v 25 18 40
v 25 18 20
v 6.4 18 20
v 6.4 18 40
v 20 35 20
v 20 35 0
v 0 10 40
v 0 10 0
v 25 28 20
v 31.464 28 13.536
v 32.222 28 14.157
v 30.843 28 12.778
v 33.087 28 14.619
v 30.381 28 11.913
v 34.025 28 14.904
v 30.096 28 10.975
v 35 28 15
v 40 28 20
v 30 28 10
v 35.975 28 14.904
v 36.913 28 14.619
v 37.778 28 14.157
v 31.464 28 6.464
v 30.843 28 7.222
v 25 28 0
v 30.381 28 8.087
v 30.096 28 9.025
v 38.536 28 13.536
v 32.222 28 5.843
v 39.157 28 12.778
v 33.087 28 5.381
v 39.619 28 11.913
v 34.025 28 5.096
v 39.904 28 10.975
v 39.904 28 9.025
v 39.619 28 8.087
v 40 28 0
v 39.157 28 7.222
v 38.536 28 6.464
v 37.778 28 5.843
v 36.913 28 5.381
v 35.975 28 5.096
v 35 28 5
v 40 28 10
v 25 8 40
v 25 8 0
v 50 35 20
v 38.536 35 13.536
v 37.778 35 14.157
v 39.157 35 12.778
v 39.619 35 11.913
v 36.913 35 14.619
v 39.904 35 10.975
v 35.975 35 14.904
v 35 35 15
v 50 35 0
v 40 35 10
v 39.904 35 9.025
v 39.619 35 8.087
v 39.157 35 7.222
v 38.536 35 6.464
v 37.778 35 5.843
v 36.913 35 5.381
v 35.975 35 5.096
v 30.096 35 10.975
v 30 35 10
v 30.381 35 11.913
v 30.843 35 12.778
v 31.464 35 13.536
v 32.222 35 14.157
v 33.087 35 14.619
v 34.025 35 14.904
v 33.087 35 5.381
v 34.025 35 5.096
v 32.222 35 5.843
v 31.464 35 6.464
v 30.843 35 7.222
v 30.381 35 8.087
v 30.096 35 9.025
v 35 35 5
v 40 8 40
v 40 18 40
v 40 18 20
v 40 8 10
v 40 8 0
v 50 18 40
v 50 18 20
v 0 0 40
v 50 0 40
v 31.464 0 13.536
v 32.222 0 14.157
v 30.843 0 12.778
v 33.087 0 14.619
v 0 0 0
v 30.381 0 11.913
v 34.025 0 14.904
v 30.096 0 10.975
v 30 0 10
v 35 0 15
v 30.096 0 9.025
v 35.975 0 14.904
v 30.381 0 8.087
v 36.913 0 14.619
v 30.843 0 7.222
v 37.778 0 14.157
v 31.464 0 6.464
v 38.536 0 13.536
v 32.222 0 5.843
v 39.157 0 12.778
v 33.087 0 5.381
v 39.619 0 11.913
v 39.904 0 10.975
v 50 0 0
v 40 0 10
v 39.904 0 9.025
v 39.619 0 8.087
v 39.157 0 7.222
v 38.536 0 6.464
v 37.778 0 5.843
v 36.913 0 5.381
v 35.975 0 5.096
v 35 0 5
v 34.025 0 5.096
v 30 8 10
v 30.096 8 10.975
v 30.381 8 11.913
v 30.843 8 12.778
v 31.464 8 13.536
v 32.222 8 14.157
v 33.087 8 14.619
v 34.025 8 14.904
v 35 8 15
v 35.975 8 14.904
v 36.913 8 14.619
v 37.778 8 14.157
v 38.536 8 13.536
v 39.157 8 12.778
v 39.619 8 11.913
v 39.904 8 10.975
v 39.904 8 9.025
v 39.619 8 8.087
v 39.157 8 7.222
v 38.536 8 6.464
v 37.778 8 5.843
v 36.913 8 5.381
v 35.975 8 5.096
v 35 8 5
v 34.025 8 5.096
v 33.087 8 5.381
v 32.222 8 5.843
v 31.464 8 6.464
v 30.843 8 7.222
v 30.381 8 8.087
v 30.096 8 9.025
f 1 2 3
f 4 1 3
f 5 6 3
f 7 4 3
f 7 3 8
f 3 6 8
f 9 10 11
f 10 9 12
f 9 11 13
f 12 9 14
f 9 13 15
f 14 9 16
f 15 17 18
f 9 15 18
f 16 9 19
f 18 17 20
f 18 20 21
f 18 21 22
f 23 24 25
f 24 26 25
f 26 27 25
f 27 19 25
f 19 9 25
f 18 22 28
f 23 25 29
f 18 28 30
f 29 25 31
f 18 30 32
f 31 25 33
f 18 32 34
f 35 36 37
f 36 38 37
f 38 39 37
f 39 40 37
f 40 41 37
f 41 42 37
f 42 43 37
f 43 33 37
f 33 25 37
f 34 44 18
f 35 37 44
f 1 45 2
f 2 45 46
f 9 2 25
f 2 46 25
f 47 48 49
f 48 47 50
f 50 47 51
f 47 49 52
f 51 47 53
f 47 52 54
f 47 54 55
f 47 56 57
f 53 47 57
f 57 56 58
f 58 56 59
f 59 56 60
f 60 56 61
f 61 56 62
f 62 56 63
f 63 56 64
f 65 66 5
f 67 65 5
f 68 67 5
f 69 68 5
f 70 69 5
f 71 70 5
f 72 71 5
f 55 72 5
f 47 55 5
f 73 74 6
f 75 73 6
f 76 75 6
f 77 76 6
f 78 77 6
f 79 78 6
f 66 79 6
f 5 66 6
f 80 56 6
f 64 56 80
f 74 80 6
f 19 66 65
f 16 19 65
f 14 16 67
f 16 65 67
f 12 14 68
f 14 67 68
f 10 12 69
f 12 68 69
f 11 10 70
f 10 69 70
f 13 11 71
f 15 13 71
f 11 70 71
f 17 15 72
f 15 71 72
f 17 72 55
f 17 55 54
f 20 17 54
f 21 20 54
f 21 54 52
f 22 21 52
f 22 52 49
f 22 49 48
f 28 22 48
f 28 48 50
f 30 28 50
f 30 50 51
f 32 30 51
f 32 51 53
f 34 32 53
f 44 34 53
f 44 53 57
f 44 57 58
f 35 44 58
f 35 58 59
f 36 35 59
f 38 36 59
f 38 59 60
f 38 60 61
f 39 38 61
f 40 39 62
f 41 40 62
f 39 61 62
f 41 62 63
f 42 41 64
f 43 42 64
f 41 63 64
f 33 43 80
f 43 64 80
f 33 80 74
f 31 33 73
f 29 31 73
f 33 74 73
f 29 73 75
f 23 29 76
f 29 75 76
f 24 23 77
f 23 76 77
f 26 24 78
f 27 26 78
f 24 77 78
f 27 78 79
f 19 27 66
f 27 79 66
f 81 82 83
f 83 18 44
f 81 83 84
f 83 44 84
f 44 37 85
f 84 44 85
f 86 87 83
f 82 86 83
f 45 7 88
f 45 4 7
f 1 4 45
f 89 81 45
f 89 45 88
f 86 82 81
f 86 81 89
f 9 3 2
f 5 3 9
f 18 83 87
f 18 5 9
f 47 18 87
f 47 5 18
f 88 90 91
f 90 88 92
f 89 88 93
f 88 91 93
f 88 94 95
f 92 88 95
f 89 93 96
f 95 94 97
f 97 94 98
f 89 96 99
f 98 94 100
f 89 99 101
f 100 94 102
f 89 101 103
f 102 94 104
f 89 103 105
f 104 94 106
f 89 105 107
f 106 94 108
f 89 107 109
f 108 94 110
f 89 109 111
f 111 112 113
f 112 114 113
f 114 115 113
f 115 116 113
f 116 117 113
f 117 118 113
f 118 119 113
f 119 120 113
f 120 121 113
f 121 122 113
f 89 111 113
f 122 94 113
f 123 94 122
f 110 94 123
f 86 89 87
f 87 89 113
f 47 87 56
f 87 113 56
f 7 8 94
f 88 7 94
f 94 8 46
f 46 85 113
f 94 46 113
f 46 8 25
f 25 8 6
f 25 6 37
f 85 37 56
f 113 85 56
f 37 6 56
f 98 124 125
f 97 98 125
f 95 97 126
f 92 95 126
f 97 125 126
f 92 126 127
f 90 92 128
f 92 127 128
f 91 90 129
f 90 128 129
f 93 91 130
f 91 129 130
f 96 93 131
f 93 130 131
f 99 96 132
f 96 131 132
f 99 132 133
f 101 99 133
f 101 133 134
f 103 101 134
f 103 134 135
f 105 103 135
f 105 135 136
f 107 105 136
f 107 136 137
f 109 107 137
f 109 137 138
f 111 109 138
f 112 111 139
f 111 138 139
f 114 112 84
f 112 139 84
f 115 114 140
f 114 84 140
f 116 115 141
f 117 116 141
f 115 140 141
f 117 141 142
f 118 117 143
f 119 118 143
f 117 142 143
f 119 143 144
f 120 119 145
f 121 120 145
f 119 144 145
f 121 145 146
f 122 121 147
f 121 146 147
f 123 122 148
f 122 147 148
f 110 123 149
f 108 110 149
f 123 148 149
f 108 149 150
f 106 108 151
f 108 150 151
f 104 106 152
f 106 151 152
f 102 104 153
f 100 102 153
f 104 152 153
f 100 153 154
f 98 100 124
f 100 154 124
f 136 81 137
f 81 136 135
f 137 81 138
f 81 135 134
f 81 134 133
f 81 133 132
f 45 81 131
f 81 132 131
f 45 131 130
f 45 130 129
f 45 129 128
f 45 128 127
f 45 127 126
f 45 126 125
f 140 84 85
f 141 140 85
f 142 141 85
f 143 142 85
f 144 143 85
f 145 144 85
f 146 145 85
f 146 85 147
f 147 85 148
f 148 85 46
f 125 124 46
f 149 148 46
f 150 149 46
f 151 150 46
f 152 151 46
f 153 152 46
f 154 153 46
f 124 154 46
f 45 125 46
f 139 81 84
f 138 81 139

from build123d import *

# Parameters (mm, degrees)
BOSS_EXTRUDE1_DEPTH = 40
BOSS_EXTRUDE2_DEPTH = 20
SKETCH2_R           = 5
CUT_EXTRUDE1_DEPTH  = 73.972597597


with BuildPart() as part:
    # Sketch1 → Boss-Extrude1 (new body)
    with BuildSketch(Plane.XY):
        Polygon((0, 10), (0, 0), (50, 0), (50, 18), (40, 18), (40, 8), (25, 8), (25, 18), (6.4, 18), align=None)
    extrude(amount=BOSS_EXTRUDE1_DEPTH)

    # Sketch1<4> → Boss-Extrude2 (add)
    with BuildSketch(Plane.XY):
        Polygon((40, 18), (50, 18), (50, 35), (20, 35), (6.4, 18), (25, 18), (25, 28), (40, 28), align=None)
    extrude(amount=BOSS_EXTRUDE2_DEPTH)

    # Sketch2 → Cut-Extrude1 (cut, through all)
    with BuildSketch(Plane(origin=(0, 35, 0), x_dir=(1, 0, 0), z_dir=(0, 1, 0))):
        with Locations((35, -10)):
            Circle(SKETCH2_R)
    extrude(amount=-CUT_EXTRUDE1_DEPTH, mode=Mode.SUBTRACT)


solid = part.part
